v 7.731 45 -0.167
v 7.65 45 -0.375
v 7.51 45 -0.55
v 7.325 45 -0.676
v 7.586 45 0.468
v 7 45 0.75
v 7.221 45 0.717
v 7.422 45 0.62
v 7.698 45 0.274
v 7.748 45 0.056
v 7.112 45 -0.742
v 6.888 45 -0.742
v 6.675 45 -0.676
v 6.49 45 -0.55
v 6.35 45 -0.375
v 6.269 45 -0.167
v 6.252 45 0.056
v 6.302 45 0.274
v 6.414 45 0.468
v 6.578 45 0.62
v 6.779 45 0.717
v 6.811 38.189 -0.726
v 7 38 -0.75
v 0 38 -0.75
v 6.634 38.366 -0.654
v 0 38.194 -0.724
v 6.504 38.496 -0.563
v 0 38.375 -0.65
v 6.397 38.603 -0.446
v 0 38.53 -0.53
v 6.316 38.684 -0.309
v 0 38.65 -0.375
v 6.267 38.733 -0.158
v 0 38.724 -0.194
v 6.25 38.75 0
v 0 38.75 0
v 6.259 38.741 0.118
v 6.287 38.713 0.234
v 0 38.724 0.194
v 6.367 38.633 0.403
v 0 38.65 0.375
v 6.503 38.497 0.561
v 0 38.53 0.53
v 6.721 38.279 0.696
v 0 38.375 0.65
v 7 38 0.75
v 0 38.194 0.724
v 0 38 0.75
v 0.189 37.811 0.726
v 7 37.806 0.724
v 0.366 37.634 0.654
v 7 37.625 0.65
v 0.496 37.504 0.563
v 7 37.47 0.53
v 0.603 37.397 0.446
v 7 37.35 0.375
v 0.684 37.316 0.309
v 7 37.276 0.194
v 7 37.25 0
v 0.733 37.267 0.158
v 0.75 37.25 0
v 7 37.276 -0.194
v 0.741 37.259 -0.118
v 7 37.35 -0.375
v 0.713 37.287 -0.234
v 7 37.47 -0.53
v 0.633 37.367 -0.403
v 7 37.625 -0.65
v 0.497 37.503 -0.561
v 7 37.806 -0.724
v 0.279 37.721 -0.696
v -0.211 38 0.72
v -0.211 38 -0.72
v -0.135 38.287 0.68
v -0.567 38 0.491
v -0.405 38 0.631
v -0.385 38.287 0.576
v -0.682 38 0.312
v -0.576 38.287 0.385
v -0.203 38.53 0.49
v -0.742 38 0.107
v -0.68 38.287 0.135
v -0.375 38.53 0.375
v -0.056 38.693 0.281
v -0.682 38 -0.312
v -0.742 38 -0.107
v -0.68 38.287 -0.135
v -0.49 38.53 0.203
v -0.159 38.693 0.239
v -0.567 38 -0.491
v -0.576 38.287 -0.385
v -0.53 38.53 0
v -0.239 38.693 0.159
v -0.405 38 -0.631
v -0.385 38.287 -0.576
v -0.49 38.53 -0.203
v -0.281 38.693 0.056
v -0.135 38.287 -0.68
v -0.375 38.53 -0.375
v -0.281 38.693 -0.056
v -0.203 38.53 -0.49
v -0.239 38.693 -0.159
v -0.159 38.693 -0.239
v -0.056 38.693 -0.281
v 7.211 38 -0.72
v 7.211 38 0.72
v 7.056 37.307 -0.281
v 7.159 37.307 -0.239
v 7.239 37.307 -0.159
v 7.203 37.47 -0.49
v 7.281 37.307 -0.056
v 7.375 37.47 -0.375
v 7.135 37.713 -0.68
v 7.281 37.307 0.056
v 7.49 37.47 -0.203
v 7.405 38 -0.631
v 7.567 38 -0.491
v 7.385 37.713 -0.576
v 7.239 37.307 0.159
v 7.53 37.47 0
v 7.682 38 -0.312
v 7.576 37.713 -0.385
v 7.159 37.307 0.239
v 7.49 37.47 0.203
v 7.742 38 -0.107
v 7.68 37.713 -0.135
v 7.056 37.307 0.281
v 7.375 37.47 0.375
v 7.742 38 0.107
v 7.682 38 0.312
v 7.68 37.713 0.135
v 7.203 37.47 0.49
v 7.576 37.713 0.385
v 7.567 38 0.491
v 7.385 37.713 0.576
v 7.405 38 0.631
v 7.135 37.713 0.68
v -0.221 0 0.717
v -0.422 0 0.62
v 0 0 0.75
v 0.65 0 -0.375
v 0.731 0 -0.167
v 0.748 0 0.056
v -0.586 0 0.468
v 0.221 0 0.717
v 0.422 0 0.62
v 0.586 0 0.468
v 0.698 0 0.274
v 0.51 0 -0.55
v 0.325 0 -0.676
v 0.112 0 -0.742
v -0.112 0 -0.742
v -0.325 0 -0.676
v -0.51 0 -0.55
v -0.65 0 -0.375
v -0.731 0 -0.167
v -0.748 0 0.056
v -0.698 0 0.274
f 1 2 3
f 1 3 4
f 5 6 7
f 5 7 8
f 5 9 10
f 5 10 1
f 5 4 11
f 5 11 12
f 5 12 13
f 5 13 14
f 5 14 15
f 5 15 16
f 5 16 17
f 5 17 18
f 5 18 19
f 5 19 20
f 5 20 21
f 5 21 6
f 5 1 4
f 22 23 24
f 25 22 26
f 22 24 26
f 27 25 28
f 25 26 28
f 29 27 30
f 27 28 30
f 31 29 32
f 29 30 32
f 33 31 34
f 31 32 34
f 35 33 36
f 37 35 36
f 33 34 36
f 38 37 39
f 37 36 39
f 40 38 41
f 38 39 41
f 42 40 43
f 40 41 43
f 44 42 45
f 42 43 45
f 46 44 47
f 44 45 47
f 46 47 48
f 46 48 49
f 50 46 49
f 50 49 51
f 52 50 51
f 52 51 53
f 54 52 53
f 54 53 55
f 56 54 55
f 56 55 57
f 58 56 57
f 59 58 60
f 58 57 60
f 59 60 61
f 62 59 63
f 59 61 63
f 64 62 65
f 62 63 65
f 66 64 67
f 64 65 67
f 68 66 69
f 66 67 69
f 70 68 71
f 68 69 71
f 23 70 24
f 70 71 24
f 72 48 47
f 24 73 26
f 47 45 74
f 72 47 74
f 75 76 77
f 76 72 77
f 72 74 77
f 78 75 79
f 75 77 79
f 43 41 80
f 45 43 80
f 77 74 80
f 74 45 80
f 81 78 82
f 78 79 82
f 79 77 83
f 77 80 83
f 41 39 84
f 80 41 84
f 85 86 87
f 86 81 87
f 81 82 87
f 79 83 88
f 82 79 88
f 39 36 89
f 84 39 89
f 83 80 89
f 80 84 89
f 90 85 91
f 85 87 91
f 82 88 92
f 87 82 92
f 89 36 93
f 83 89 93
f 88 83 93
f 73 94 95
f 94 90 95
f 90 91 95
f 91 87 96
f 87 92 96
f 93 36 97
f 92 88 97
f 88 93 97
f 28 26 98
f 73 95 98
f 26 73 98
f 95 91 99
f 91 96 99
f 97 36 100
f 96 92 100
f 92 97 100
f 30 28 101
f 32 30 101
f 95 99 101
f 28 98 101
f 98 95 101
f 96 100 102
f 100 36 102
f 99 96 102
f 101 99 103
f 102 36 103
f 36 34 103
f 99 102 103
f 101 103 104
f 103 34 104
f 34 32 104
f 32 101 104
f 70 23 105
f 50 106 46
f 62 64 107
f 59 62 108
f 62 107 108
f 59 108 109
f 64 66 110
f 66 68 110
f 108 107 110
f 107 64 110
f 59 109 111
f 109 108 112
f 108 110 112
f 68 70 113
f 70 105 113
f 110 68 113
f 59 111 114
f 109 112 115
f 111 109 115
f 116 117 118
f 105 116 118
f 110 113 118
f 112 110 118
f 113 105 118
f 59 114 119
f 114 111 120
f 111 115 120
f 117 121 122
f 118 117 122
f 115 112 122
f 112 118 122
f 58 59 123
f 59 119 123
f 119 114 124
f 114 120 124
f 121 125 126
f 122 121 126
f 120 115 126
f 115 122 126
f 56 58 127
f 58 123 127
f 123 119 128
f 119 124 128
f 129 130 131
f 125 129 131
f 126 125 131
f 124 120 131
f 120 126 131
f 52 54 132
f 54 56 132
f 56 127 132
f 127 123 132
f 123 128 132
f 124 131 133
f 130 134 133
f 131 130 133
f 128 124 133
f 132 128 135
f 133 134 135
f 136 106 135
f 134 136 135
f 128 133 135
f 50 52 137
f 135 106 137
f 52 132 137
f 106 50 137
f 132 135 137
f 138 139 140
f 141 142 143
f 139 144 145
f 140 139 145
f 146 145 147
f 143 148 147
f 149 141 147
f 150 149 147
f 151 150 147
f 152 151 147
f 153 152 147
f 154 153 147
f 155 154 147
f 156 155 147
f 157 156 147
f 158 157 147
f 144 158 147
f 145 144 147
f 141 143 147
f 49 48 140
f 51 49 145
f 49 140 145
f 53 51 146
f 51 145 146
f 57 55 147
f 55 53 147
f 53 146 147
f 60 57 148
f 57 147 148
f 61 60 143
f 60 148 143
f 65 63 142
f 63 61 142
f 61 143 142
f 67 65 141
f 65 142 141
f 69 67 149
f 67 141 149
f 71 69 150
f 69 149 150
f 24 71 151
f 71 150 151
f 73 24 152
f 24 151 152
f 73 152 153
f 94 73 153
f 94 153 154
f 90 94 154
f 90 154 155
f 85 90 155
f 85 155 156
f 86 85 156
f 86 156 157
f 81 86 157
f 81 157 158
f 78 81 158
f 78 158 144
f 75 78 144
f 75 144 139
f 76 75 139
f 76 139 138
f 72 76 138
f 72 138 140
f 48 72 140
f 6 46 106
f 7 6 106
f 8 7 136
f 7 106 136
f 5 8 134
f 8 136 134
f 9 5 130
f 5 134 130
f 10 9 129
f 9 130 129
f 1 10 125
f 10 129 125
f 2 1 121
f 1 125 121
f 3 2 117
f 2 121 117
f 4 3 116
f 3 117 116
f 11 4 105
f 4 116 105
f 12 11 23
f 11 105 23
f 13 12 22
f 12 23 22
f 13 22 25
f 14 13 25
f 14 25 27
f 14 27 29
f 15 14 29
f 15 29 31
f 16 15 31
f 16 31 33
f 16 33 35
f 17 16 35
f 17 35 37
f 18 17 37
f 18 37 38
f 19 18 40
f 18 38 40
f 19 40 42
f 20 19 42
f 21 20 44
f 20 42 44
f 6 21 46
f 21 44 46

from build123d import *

# Parameters (mm, degrees)
SKETCH_1_R      = 0.75
EXTRUDE_1_DEPTH = 38
SKETCH_3_R      = 0.75
EXTRUDE_2_DEPTH = 7
SKETCH_5_R      = 0.75
EXTRUDE_3_DEPTH = 7


with BuildPart() as part:
    # 草图1 → 凸台-拉伸1 (new body)
    with BuildSketch(Plane(origin=(0, 0, 0), x_dir=(1, 0, 0), z_dir=(0, 1, 0))):
        with Locations(Location((0, 0, 0), (0, 0, 270))):
            Circle(SKETCH_1_R)
    extrude(amount=EXTRUDE_1_DEPTH)

    # 草图2 → 旋转1 (revolve)
    with BuildSketch(Plane.XY):
        with BuildLine():
            Line((0, 38.75), (0, 37.25))
            ThreePointArc((0, 37.25), (0.75, 38), (0, 38.75))
        make_face()
    revolve(axis=Axis((0, 38.75, 0), (0, -1, 0)))

    # 草图3 → 凸台-拉伸2 (add)
    with BuildSketch(Plane(origin=(0, 0, 0), x_dir=(0, 0, -1), z_dir=(1, 0, 0))):
        with Locations((0, 38)):
            Circle(SKETCH_3_R)
    extrude(amount=EXTRUDE_2_DEPTH)

    # 草图4 → 旋转2 (revolve)
    with BuildSketch(Plane(origin=(7, 0, 0), x_dir=(0, 0, -1), z_dir=(1, 0, 0))):
        with BuildLine():
            Line((0, 38.75), (0, 37.25))
            ThreePointArc((0, 37.25), (0.75, 38), (0, 38.75))
        make_face()
    revolve(axis=Axis((7, 38.75, 0), (0, -1, 0)))

    # 草图5 → 凸台-拉伸3 (add)
    with BuildSketch(Plane(origin=(0, 38, 0), x_dir=(1, 0, 0), z_dir=(0, 1, 0))):
        with Locations(Location((7, 0, 0), (0, 0, 270))):
            Circle(SKETCH_5_R)
    extrude(amount=EXTRUDE_3_DEPTH)


solid = part.part
